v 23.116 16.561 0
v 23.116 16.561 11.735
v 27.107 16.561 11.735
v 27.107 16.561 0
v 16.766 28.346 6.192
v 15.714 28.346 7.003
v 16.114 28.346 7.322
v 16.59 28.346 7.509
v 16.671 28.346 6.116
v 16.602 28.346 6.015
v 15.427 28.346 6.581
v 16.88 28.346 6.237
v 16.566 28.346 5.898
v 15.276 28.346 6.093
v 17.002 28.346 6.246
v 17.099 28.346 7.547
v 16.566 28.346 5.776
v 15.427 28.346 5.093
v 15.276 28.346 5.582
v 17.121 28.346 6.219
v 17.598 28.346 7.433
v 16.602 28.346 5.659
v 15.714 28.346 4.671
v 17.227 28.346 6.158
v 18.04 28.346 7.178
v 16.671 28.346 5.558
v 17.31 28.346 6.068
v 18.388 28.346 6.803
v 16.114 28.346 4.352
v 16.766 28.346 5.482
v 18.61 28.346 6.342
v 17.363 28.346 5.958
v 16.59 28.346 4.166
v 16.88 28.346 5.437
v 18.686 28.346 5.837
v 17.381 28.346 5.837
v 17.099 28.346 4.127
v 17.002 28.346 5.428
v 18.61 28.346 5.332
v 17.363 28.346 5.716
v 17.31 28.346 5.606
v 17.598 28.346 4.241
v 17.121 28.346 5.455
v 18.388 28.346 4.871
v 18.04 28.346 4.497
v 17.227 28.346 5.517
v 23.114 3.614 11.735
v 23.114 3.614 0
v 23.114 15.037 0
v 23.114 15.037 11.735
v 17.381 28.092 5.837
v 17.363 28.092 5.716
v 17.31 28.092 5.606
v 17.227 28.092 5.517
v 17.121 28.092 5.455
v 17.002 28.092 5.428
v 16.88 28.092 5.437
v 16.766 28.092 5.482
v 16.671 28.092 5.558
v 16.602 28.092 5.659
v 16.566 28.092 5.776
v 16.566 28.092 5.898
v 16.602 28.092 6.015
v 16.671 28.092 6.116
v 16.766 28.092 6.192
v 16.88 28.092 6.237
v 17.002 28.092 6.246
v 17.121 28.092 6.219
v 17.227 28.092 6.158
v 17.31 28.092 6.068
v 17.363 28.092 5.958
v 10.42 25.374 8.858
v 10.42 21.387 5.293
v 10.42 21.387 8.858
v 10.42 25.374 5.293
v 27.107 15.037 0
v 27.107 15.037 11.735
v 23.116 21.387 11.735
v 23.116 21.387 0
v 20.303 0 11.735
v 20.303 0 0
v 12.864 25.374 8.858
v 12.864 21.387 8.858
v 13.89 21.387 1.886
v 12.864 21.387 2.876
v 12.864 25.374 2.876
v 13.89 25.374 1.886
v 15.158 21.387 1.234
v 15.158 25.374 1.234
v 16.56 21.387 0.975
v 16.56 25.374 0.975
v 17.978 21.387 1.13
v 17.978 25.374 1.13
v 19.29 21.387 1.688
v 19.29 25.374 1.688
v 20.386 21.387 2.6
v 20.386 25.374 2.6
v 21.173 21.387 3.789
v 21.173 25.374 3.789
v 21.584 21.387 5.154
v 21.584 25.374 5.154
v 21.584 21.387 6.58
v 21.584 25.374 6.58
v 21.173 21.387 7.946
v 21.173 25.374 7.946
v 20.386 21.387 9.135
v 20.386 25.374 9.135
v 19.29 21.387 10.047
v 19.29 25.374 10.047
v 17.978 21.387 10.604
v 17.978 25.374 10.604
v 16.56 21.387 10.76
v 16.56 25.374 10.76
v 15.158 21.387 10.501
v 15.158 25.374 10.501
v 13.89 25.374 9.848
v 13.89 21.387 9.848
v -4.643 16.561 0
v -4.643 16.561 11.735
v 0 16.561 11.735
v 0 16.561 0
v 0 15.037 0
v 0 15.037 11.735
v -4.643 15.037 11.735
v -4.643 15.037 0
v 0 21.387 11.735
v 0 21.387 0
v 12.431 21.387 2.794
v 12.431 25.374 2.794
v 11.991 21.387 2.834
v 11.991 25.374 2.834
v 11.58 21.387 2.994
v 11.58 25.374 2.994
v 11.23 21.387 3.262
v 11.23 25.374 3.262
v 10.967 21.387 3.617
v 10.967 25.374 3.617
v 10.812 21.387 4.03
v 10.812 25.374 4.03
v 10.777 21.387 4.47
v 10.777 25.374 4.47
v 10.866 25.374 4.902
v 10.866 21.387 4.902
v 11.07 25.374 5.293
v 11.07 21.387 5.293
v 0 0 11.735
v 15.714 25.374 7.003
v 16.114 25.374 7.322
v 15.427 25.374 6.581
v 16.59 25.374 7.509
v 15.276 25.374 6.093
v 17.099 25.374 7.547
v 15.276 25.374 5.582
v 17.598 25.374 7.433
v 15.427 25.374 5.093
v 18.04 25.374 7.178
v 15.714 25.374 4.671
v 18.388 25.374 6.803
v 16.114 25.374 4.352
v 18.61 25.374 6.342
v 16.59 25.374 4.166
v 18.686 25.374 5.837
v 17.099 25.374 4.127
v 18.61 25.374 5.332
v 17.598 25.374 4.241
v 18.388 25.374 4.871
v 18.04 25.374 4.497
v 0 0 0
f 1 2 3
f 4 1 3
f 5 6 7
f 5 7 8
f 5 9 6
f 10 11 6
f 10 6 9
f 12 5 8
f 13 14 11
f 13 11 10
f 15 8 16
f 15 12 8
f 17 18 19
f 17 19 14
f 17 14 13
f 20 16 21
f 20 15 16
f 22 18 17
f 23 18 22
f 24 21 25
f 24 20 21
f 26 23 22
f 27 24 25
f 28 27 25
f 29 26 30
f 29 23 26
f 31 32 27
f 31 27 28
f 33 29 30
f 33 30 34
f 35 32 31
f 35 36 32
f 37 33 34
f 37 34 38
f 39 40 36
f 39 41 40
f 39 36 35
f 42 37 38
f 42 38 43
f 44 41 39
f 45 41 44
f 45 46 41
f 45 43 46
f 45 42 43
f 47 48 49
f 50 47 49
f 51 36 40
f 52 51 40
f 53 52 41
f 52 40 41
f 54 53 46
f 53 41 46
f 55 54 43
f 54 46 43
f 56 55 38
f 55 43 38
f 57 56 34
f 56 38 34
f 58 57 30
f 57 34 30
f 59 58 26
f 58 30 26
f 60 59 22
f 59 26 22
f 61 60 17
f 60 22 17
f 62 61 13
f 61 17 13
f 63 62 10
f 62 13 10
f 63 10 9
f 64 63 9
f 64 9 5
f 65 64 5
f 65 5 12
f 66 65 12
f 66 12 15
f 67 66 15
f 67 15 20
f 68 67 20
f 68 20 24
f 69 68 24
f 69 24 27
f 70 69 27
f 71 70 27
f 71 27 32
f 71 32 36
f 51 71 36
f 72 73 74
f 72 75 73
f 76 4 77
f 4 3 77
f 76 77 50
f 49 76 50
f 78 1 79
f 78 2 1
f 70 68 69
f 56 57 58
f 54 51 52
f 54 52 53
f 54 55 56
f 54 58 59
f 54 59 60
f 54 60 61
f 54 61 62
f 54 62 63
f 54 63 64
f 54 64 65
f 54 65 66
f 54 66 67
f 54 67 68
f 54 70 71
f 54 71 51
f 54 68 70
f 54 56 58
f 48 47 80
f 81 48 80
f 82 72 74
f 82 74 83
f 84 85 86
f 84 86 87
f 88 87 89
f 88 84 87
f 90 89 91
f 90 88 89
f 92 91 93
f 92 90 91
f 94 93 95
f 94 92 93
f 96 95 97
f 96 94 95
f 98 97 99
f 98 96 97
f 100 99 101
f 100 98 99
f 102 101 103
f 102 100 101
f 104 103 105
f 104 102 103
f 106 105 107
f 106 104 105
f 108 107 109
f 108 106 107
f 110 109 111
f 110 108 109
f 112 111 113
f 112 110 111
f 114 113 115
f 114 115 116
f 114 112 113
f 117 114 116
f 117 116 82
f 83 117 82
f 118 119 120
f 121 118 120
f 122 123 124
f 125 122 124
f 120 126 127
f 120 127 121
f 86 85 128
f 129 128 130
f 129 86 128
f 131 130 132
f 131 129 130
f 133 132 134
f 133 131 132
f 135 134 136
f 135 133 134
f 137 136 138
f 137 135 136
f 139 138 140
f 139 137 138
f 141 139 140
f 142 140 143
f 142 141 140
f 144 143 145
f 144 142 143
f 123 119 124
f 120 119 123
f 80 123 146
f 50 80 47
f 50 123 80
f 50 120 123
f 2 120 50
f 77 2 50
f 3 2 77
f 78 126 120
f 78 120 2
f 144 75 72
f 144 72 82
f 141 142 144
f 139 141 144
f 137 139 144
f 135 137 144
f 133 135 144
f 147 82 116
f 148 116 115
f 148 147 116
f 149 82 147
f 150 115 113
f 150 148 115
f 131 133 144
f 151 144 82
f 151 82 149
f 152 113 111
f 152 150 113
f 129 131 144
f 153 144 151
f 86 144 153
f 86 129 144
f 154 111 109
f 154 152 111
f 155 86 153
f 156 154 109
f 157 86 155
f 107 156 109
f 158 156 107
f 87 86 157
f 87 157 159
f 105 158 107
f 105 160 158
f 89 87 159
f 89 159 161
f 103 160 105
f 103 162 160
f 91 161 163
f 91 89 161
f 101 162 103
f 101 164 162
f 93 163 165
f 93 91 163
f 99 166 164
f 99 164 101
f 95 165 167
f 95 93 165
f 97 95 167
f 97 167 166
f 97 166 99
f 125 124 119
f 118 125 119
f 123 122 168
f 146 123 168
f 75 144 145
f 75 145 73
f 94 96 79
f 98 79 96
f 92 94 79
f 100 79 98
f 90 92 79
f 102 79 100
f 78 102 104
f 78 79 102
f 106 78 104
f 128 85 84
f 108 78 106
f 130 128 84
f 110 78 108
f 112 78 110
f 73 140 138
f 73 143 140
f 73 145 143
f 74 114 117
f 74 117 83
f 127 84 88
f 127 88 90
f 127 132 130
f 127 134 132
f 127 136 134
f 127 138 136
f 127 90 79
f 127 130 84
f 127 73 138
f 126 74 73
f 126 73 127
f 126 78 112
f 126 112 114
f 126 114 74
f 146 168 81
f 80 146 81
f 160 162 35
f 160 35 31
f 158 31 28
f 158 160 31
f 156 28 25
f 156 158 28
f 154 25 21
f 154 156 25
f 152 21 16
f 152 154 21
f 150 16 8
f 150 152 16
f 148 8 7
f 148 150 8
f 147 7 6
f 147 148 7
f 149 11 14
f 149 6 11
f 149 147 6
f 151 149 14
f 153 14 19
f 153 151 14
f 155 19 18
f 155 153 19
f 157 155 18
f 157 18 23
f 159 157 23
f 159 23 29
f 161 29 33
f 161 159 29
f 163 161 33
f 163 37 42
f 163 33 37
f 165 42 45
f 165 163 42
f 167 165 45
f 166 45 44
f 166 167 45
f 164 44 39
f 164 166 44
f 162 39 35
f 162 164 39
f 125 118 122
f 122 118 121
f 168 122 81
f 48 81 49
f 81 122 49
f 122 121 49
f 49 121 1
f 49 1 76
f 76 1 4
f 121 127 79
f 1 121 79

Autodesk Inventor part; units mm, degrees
ref_plane "YZ Plane" through (0, 0, 0) normal (1, 0, 0) x (0, 1, 0)
ref_plane "XZ Plane" through (0, 0, 0) normal (0, 1, 0) x (-1, 0, 0)
ref_plane "XY Plane" through (0, 0, 0) normal (0, 0, 1) x (1, 0, 0)
sketch "Sketch1" plane through (0, 0, 0) normal (0, 0, 1) x (1, 0, 0)
  line L0 (0, 0) -> (23.114, 0)
  line L1 (23.114, 0) -> (23.114, 15.0368)
  line L2 (23.114, 15.0368) -> (0, 15.0368)
  line L3 (0, 15.0368) -> (0, 0)
  dimension "d0" = 15.0368
  dimension "d1" = 23.114
extrude "Extrusion1" add sketch "Sketch1" along normal blind 11.7348
sketch "Sketch2" plane through (0, 0, 11.7348) normal (0, 0, 1) x (1, 0, 0)
  line L0 (23.114, 0) -> (23.114, 3.6138)
  line L1 (23.114, 0) -> (23.114, 15.0368) projected
  line L2 (0, 0) -> (23.114, 0) projected
  line L3 (20.3034, 0) -> (23.114, 0)
  line L4 (23.114, 3.6138) -> (20.3034, 0)
extrude "Extrusion2" cut sketch "Sketch2" against normal blind 11.7348
sketch "Sketch3" plane through (0, 0, 11.7348) normal (0, 0, 1) x (1, 0, 0)
  line L0 (-4.6433, 16.5606) -> (27.1067, 16.5606)
  line L1 (27.1067, 16.5606) -> (27.1067, 15.0366)
  line L2 (27.1067, 15.0366) -> (-4.6433, 15.0366)
  line L3 (-4.6433, 15.0366) -> (-4.6433, 16.5606)
  line L4 (23.114, 15.0368) -> (0, 15.0368) projected
  point P0 (0, 0)
  dimension "d6" = 31.75
  dimension "d7" = 1.524
extrude "Extrusion3" add sketch "Sketch3" against normal blind 11.7348
sketch "Sketch4" plane through (0, 0, 11.7348) normal (0, 0, 1) x (1, 0, 0)
  line L0 (-4.6433, 16.5606) -> (27.1067, 16.5606) projected
  line L1 (0, 16.5606) -> (23.1157, 16.5606)
  line L2 (23.1157, 16.5606) -> (23.1157, 21.3866)
  line L3 (23.1157, 21.3866) -> (0, 21.3866)
  line L4 (0, 21.3866) -> (0, 16.5606)
  point P0 (0, 0)
  dimension "d10" = 4.826
extrude "Extrusion4" add sketch "Sketch4" against normal up to surface (11.7348 mm away)
sketch "Sketch5" plane through (0, 21.3866, 11.7348) normal (0, 1, 0) x (1, 0, 0)
  circle A0 centre (16.7403, 5.8674) radius 4.8959
  point P0 (0, 11.7348)
  dimension "d14" = 9.7917
extrude "Extrusion5" add sketch "Sketch5" along normal blind 3.9878
sketch "Sketch6" plane through (16.7403, 25.3744, 5.8674) normal (0, 1, 0) x (1, 0, 0)
  circle A0 centre (0, 0) radius 4.8958 projected
  arc A1 (-3.876, 2.991) -> (-5.6698, 0.5745) centre (-4.3859, 1.4955) ccw
  line L0 (-5.6698, 0.5745) -> (-6.3204, 0.5745)
  line L1 (-6.3204, 0.5745) -> (-6.3204, -2.991)
  line L2 (-6.3204, -2.991) -> (-3.876, -2.991)
  line L3 (-3.876, 0) -> (-3.876, 0.5745)
  point P0 (-16.7403, 5.8674)
extrude "Extrusion6" add sketch "Sketch6" against normal blind 3.9878 contours A0 L2 L1 L0 A1
sketch "Sketch7" plane through (0, 25.3744, 11.7348) normal (0, 1, 0) x (1, 0, 0)
  circle A0 centre (16.9713, 5.8977) radius 1.7145
  point P0 (0, 11.7348)
  dimension "d19" = 3.429
extrude "Extrusion7" add sketch "Sketch7" along normal blind 2.9718
sketch "Sketch8" plane through (16.9713, 28.3462, 5.8371) normal (0, 1, 0) x (1, 0, 0)
  circle A0 centre (0, 0) radius 0.41
  point P0 (-16.9713, 5.8371)
extrude "Extrusion8" cut sketch "Sketch8" against normal blind 0.254
